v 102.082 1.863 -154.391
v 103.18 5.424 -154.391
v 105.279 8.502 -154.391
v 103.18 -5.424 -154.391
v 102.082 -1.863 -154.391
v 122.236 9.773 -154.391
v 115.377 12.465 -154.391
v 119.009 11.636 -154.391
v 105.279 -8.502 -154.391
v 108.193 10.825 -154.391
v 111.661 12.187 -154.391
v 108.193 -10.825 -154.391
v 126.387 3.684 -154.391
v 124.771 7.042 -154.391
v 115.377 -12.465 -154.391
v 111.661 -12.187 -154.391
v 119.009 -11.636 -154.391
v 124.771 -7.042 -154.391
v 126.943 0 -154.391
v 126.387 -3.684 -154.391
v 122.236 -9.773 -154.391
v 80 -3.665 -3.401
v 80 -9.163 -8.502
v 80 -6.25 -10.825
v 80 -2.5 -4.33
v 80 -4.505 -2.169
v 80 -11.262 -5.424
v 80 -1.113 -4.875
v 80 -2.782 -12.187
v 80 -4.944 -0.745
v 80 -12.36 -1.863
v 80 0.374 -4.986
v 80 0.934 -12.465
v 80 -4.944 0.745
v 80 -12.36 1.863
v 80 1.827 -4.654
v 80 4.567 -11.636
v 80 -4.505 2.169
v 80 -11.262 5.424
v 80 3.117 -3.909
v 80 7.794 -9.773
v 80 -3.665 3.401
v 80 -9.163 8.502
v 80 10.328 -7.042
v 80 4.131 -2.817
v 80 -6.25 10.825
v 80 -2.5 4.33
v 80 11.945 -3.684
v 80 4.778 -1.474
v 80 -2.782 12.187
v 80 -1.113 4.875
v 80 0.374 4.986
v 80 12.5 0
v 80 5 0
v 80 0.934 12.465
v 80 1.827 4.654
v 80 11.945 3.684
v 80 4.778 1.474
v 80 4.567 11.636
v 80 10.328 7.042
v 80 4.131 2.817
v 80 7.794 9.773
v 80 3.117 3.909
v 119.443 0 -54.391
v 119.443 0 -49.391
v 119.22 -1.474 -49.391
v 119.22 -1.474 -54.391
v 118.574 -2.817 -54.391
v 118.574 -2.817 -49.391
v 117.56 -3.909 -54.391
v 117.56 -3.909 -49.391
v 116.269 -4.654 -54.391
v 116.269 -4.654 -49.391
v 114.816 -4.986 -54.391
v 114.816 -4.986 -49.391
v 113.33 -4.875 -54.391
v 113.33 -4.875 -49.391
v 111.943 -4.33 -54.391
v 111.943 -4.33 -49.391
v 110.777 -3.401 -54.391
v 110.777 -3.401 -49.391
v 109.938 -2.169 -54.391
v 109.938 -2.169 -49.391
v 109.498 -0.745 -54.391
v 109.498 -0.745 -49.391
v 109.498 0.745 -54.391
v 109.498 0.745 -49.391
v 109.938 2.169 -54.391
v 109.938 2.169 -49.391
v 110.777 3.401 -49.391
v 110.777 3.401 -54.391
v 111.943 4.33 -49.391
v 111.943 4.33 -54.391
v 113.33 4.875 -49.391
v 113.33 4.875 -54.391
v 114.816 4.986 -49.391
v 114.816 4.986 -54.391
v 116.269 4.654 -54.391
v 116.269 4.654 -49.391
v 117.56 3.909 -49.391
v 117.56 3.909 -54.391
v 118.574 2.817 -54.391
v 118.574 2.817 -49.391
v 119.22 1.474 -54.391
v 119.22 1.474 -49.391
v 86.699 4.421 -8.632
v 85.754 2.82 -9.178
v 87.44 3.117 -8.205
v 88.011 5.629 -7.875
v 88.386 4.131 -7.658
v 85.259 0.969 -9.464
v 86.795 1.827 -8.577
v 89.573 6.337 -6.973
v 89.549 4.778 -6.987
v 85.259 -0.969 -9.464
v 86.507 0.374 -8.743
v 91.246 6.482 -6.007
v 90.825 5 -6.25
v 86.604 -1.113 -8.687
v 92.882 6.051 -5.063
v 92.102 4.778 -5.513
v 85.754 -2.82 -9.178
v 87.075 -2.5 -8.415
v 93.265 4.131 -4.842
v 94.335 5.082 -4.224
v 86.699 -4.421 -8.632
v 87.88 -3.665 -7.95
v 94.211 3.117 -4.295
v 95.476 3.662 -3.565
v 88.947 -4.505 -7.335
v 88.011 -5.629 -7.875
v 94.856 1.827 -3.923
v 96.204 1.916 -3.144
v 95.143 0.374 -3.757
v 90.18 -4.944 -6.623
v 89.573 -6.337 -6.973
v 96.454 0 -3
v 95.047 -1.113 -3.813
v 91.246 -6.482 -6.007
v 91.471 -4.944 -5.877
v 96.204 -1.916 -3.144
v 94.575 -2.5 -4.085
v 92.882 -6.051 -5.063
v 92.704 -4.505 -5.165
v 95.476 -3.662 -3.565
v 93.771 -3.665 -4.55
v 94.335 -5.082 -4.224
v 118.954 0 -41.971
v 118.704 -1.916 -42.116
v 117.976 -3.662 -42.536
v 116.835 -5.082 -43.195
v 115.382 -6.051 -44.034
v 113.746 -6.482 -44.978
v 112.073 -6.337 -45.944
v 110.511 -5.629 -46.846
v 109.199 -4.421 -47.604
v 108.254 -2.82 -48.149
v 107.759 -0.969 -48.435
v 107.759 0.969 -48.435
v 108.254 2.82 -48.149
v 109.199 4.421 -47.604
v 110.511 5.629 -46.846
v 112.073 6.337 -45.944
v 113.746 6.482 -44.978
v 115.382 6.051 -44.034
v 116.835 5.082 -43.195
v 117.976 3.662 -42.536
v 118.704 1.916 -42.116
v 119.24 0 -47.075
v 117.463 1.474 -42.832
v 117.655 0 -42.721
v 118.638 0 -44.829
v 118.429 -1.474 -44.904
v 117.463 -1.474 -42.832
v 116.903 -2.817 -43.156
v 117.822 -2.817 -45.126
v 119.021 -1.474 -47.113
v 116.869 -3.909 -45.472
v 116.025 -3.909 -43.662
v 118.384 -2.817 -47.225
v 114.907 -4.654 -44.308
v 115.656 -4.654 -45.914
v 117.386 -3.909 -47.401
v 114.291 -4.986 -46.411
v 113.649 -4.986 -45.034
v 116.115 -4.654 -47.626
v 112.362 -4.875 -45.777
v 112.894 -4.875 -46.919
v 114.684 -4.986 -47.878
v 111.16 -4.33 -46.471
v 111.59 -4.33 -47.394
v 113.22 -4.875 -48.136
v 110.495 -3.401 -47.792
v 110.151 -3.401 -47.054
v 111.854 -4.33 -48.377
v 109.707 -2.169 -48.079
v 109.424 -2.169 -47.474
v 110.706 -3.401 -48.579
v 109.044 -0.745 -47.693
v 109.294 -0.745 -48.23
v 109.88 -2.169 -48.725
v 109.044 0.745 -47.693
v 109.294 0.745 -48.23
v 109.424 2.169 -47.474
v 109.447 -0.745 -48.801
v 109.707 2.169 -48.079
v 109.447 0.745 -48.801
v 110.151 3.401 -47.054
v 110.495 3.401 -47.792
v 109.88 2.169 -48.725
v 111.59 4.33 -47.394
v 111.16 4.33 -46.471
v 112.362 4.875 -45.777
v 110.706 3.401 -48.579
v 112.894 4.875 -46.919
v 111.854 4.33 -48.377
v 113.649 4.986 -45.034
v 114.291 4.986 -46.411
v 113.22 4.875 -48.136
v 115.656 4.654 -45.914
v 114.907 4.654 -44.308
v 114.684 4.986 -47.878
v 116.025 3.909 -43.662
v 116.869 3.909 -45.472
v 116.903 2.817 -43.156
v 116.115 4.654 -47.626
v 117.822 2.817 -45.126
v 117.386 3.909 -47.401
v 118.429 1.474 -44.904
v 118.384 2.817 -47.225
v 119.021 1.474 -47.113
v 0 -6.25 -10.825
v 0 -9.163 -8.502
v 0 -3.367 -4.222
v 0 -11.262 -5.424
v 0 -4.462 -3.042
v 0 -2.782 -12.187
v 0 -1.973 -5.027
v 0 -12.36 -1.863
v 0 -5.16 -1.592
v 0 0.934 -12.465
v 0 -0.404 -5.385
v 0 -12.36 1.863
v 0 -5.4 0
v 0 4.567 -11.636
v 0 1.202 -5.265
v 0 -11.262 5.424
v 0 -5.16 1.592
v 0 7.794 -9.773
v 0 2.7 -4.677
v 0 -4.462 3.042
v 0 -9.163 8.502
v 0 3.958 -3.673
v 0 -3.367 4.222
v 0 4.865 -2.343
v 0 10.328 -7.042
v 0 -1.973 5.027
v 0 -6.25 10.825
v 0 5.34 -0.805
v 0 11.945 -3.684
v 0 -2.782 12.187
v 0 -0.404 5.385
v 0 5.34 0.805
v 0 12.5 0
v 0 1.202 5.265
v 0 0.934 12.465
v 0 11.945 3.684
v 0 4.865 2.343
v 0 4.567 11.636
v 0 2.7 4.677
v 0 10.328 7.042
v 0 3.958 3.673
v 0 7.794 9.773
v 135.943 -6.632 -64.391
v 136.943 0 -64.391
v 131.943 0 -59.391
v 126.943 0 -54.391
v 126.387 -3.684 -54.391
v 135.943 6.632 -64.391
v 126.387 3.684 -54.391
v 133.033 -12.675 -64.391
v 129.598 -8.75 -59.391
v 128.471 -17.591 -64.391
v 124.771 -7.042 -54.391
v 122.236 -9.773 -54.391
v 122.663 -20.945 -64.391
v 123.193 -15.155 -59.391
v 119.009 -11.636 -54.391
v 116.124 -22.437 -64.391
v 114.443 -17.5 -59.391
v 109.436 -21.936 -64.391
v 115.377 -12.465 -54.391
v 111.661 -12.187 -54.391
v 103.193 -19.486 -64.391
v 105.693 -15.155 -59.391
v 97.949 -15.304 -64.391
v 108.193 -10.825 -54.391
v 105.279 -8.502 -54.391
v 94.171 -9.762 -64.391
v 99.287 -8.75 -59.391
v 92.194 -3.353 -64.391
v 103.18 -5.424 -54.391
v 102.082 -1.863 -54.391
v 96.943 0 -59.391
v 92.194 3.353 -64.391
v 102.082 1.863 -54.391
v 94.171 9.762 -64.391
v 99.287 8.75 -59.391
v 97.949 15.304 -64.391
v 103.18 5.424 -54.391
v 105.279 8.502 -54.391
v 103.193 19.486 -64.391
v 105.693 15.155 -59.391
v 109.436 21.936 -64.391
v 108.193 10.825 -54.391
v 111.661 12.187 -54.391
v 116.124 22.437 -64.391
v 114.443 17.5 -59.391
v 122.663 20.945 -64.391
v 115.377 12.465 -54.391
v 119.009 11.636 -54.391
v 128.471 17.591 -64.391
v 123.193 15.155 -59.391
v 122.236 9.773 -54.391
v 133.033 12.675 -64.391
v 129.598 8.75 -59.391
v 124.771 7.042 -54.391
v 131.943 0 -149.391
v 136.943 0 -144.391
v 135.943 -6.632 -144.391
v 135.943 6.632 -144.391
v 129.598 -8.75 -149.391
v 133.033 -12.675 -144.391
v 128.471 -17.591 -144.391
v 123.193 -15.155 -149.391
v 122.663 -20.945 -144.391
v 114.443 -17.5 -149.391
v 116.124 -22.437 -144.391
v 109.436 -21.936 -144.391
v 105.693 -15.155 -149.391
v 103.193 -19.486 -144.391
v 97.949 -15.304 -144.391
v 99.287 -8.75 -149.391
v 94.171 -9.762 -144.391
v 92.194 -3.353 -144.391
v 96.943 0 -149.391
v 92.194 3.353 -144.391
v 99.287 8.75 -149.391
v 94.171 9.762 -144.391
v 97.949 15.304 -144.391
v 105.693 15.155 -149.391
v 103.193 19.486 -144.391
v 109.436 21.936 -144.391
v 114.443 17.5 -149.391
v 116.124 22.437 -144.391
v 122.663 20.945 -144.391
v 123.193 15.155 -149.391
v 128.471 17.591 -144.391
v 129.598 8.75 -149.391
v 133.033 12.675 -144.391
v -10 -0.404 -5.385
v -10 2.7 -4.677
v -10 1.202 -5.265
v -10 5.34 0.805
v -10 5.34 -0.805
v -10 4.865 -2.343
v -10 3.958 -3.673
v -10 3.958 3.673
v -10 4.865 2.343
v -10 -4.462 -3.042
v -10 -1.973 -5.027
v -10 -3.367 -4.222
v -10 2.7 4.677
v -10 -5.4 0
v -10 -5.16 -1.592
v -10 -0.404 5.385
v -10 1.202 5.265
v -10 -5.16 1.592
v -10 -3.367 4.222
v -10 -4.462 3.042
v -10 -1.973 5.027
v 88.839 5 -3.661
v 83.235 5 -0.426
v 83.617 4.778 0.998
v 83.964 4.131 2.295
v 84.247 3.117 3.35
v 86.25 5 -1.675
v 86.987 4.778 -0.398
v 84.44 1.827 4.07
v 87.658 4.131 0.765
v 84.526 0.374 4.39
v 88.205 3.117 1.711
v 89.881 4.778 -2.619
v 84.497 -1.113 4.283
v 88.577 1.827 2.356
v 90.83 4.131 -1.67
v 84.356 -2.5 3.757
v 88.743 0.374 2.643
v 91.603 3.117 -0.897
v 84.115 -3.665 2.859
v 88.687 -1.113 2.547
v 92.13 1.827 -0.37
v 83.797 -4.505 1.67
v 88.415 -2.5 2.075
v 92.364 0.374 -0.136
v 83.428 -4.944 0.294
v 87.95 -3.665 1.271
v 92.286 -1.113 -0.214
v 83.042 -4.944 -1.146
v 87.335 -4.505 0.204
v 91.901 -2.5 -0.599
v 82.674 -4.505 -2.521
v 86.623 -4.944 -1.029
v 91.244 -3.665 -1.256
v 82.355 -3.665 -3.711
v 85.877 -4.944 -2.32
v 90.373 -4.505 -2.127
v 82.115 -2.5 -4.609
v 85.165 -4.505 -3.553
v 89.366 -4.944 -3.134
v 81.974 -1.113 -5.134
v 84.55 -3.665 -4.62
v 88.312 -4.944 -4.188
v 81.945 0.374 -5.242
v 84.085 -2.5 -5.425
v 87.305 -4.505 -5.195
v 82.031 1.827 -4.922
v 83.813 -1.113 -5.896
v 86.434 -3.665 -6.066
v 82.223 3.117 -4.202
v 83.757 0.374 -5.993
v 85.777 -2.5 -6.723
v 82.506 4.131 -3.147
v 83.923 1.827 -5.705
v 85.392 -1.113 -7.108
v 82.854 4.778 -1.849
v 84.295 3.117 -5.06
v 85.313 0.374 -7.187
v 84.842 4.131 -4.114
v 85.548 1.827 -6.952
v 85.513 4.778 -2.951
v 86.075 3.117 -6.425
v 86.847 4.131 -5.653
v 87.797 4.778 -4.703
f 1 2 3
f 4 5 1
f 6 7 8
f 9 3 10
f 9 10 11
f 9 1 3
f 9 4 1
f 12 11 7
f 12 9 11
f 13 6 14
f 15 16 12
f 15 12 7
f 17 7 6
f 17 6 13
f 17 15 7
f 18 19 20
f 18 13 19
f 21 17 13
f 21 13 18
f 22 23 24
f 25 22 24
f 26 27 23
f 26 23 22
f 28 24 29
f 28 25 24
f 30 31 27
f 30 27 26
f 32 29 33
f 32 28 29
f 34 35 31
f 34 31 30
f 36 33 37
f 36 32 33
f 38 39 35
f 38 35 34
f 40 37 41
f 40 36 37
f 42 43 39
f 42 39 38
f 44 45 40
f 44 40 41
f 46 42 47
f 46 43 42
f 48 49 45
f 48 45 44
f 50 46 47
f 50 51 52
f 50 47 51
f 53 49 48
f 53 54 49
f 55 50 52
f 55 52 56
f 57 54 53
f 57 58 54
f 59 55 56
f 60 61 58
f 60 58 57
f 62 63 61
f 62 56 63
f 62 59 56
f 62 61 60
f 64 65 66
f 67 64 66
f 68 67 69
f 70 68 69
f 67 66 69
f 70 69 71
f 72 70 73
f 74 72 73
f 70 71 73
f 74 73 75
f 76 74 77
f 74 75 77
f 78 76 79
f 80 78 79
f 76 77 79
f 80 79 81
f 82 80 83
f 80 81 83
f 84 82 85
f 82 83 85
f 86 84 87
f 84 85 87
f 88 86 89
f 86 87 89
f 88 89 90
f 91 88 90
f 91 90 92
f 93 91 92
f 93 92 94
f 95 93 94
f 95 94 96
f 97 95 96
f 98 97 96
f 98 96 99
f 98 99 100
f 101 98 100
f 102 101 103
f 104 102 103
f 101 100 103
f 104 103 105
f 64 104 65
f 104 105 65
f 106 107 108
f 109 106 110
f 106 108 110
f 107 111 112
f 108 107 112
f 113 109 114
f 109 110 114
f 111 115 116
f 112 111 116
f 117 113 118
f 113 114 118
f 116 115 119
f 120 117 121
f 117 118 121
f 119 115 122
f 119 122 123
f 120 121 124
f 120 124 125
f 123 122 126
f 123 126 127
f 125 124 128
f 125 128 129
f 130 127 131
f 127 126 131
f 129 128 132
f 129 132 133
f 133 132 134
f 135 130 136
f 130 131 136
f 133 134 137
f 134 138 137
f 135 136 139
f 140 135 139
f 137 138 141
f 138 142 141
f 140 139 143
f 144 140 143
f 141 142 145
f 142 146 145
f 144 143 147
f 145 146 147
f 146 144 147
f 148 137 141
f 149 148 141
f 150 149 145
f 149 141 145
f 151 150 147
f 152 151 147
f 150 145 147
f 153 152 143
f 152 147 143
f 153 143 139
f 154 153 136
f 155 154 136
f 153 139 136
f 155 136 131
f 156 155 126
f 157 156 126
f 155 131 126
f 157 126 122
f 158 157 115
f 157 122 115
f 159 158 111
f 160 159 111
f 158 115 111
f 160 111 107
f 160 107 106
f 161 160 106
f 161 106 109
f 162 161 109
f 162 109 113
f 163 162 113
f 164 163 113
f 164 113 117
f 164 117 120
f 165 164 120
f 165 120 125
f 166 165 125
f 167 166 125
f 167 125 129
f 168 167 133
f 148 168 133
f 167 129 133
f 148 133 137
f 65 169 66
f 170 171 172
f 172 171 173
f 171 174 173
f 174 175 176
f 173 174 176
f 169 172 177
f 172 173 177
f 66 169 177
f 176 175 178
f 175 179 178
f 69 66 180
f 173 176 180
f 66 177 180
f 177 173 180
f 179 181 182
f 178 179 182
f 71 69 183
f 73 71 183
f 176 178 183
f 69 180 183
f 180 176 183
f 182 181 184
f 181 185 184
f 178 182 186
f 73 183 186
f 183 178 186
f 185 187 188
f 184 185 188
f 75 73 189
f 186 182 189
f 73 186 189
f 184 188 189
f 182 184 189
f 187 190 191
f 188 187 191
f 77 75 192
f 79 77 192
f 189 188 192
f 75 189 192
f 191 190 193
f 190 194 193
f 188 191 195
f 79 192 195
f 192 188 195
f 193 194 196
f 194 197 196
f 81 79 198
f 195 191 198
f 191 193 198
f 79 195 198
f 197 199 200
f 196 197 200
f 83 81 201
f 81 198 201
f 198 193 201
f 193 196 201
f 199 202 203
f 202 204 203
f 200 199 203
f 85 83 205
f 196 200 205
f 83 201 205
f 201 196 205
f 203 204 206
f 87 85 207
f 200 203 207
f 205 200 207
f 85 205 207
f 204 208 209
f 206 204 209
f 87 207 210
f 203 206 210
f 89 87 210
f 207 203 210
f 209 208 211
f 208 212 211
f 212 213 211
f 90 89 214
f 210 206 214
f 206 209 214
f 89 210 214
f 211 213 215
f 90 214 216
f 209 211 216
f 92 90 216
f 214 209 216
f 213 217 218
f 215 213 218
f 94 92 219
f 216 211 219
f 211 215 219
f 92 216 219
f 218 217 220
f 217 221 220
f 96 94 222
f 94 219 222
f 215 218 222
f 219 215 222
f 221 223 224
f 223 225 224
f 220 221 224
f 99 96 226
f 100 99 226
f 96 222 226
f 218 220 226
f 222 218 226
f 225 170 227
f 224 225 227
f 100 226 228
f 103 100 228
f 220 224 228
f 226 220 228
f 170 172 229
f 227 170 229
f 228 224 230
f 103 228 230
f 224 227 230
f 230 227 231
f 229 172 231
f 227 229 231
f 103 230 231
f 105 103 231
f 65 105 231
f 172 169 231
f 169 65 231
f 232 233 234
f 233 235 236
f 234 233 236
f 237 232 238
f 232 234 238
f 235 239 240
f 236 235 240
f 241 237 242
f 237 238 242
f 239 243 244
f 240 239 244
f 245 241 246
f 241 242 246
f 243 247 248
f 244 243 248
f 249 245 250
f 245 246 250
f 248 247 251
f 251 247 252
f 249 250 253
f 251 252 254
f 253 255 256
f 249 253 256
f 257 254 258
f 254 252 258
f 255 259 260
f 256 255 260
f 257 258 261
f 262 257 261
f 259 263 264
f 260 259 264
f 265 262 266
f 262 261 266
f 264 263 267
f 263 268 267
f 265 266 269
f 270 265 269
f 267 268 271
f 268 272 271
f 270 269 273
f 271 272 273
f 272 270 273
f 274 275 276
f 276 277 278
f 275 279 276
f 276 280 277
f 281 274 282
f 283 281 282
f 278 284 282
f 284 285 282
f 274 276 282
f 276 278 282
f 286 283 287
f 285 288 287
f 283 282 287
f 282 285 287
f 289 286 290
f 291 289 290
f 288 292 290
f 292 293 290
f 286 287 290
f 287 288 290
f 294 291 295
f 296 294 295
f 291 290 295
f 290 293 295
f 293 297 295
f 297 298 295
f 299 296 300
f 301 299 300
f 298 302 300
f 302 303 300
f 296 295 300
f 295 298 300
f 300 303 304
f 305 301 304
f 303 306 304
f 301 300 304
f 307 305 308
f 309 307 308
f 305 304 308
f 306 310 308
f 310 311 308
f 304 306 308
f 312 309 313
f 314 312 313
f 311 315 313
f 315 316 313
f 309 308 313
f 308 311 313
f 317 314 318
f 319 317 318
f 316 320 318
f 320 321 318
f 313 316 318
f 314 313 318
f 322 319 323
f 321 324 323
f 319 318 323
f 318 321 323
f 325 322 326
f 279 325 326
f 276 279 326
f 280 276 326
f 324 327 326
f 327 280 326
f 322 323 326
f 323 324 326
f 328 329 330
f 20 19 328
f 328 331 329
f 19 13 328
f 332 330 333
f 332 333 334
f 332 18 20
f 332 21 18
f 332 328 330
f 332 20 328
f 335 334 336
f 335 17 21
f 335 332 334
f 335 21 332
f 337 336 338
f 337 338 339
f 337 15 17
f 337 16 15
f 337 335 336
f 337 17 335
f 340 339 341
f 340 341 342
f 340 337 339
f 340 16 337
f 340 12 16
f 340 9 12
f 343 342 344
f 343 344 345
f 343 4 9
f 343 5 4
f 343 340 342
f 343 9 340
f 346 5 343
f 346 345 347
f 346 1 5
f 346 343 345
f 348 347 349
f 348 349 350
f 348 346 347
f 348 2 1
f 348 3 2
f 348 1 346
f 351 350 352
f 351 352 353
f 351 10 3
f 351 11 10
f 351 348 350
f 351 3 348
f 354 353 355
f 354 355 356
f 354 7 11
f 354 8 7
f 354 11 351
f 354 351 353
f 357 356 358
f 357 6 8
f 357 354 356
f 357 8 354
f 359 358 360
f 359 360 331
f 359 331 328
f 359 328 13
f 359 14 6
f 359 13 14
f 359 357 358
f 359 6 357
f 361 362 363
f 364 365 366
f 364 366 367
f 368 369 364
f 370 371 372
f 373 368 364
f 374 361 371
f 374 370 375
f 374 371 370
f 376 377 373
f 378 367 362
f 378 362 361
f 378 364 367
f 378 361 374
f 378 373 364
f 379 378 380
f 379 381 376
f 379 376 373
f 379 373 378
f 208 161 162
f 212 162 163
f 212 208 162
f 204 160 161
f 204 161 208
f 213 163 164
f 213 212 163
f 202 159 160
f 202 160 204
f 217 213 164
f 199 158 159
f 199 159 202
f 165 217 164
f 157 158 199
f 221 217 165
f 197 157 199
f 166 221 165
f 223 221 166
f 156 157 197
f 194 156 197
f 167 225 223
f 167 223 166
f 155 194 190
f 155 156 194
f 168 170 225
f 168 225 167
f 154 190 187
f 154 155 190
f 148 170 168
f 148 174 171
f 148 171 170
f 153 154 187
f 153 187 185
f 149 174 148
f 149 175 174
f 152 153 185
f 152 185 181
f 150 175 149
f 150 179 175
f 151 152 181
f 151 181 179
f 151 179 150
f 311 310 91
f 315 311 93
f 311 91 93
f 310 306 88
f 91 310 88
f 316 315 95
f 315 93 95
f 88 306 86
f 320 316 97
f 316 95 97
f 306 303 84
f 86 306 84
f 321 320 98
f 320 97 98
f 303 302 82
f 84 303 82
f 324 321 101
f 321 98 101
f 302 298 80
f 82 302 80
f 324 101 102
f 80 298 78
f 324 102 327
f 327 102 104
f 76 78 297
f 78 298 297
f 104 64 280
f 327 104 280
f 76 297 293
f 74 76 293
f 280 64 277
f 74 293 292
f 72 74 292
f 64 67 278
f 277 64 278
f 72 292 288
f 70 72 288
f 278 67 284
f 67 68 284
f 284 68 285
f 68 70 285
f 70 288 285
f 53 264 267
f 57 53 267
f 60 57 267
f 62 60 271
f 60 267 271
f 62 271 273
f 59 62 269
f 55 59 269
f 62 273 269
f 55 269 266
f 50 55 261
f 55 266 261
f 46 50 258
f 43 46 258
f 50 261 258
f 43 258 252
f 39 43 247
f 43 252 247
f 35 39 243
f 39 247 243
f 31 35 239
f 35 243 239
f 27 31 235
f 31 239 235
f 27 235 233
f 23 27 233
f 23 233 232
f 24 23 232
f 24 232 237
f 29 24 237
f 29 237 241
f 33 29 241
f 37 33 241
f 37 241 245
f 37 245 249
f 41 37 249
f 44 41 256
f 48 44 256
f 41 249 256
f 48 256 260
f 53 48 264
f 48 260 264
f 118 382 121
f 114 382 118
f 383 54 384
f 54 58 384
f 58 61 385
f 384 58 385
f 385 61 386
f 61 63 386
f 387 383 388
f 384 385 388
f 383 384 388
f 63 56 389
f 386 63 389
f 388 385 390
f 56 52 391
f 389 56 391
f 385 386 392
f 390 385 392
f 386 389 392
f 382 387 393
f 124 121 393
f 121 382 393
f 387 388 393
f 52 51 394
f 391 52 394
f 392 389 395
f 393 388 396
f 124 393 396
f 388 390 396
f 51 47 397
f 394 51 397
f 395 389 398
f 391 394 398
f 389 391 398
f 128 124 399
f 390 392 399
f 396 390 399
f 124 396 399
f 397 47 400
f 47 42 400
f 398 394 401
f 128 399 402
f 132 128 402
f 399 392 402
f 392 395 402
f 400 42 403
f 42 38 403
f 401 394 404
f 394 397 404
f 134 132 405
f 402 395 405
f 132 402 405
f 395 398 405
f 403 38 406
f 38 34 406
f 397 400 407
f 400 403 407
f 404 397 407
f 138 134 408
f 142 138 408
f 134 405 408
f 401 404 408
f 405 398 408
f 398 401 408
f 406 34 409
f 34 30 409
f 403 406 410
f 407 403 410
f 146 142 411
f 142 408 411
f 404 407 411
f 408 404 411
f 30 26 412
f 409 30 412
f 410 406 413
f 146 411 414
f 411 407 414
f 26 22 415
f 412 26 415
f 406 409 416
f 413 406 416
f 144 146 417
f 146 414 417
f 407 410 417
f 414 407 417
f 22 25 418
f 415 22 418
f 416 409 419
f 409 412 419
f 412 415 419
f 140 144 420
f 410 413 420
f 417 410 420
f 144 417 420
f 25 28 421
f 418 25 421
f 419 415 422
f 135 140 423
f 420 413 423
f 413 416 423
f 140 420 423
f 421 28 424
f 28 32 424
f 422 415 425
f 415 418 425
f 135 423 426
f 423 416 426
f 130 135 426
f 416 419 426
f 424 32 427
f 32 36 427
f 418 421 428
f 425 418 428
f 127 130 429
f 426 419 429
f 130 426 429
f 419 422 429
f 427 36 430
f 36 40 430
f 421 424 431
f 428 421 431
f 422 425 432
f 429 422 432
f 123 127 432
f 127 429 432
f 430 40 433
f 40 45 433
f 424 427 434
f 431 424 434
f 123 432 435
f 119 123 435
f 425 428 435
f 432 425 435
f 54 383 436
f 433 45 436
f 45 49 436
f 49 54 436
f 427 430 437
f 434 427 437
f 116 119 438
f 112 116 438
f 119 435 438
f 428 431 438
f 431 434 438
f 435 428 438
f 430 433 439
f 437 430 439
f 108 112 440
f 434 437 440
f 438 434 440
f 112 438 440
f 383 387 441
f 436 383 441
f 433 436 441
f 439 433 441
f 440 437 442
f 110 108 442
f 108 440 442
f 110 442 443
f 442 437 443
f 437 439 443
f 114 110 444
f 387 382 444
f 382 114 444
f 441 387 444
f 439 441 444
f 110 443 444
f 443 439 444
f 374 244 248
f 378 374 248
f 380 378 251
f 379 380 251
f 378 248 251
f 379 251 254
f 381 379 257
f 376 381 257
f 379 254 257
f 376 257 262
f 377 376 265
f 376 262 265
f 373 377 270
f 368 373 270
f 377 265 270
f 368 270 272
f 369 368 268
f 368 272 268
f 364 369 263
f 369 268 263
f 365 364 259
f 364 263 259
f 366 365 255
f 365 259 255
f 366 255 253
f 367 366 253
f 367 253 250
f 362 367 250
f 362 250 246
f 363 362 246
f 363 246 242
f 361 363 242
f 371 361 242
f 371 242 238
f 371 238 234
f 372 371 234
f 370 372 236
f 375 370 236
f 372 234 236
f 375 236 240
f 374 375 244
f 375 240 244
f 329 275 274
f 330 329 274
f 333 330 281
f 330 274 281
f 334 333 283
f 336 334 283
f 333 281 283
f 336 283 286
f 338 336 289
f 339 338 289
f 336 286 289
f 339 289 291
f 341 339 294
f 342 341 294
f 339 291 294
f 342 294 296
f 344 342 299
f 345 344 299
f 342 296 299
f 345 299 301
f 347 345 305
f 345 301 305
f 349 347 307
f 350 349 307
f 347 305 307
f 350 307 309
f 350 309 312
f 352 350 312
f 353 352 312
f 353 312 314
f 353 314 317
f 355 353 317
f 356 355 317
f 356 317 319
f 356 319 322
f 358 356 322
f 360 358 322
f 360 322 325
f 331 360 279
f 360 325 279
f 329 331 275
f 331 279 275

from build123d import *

# Parameters (mm, degrees)
F0_R      = 12.5
F1_DEPTH  = 80
F2_R      = 5
F3_ANGLE  = 60
F4_R      = 6.5
F5_DEPTH  = 45
F6_R      = 5.4
F7_DEPTH  = 10
F8_R      = 5
F9_ANGLE  = 30
F10_DEPTH = 5
F11_R     = 22.5
F11_R_2   = 5
F12_DEPTH = 100
F13_SIZE  = 10
F14_SIZE  = 10


with BuildPart() as f1:
    # F0 (on Right) → F1 (new body)
    with BuildSketch(Plane.YZ):
        Circle(F0_R)
    extrude(amount=F1_DEPTH)

    # F2 (on face) → F3 (revolve)
    with BuildSketch(Plane.YZ.offset(80)):
        Circle(F2_R)
    revolve(axis=Axis((80, 12.480231002, -12.5), (0, 1, 0)), revolution_arc=F3_ANGLE)

    # F4 (on face) → F5 (join)
    with BuildSketch(Plane(origin=(25.4126587737, 0, -44.0160161514), x_dir=(0.8660254038, 0, 0.5), z_dir=(0.5, 0, -0.8660254038))):
        with Locations((75.5320323028, 0)):
            Circle(F4_R)
    extrude(amount=F5_DEPTH)

    # F6 (on face) → F7 (join)
    with BuildSketch(Plane(origin=(0, 0, 0), x_dir=(0, -1, 0), z_dir=(-1, 0, 0))):
        Circle(F6_R)
    extrude(amount=F7_DEPTH)

    # F8 (on face) → F9 (revolve)
    with BuildSketch(Plane(origin=(47.9126587737, 0, -82.9871593217), x_dir=(0.8660254038, 0, 0.5), z_dir=(0.5, 0, -0.8660254038))):
        with Locations((75.5320323028, 0)):
            Circle(F8_R)
    revolve(axis=Axis((106.1030469169, 6.7506376654, -49.3909230629), (0, 1, 0)), revolution_arc=F9_ANGLE)

    # F10 (add): a face of the model
    f10_faces = [f1.faces().sort_by_distance(p)[0] for p in [
        (114.4426067022, 0, -49.3909230629),
    ]]
    extrude(f10_faces, amount=F10_DEPTH)

    # F11 (on face) → F12 (join)
    with BuildSketch(Plane(origin=(0, 0, -54.3909230629), x_dir=(1, 0, 0), z_dir=(0, 0, -1))):
        with Locations((114.4426067022, 0)):
            Circle(F11_R)
        with Locations((114.4426067022, 0)):
            Circle(F11_R_2, mode=Mode.SUBTRACT)
        with Locations((114.4426067022, 0)):
            Circle(F11_R_2)
    extrude(amount=F12_DEPTH)

    # F13
    f13_edges = [f1.edges().sort_by_distance(p)[0] for p in [
        (91.942607, 0, -54.390923),
    ]]
    chamfer(f13_edges, length=F13_SIZE)

    # F14
    f14_edges = [f1.edges().sort_by_distance(p)[0] for p in [
        (91.942607, 0, -154.390923),
    ]]
    chamfer(f14_edges, length=F14_SIZE)


solid = f1.part
